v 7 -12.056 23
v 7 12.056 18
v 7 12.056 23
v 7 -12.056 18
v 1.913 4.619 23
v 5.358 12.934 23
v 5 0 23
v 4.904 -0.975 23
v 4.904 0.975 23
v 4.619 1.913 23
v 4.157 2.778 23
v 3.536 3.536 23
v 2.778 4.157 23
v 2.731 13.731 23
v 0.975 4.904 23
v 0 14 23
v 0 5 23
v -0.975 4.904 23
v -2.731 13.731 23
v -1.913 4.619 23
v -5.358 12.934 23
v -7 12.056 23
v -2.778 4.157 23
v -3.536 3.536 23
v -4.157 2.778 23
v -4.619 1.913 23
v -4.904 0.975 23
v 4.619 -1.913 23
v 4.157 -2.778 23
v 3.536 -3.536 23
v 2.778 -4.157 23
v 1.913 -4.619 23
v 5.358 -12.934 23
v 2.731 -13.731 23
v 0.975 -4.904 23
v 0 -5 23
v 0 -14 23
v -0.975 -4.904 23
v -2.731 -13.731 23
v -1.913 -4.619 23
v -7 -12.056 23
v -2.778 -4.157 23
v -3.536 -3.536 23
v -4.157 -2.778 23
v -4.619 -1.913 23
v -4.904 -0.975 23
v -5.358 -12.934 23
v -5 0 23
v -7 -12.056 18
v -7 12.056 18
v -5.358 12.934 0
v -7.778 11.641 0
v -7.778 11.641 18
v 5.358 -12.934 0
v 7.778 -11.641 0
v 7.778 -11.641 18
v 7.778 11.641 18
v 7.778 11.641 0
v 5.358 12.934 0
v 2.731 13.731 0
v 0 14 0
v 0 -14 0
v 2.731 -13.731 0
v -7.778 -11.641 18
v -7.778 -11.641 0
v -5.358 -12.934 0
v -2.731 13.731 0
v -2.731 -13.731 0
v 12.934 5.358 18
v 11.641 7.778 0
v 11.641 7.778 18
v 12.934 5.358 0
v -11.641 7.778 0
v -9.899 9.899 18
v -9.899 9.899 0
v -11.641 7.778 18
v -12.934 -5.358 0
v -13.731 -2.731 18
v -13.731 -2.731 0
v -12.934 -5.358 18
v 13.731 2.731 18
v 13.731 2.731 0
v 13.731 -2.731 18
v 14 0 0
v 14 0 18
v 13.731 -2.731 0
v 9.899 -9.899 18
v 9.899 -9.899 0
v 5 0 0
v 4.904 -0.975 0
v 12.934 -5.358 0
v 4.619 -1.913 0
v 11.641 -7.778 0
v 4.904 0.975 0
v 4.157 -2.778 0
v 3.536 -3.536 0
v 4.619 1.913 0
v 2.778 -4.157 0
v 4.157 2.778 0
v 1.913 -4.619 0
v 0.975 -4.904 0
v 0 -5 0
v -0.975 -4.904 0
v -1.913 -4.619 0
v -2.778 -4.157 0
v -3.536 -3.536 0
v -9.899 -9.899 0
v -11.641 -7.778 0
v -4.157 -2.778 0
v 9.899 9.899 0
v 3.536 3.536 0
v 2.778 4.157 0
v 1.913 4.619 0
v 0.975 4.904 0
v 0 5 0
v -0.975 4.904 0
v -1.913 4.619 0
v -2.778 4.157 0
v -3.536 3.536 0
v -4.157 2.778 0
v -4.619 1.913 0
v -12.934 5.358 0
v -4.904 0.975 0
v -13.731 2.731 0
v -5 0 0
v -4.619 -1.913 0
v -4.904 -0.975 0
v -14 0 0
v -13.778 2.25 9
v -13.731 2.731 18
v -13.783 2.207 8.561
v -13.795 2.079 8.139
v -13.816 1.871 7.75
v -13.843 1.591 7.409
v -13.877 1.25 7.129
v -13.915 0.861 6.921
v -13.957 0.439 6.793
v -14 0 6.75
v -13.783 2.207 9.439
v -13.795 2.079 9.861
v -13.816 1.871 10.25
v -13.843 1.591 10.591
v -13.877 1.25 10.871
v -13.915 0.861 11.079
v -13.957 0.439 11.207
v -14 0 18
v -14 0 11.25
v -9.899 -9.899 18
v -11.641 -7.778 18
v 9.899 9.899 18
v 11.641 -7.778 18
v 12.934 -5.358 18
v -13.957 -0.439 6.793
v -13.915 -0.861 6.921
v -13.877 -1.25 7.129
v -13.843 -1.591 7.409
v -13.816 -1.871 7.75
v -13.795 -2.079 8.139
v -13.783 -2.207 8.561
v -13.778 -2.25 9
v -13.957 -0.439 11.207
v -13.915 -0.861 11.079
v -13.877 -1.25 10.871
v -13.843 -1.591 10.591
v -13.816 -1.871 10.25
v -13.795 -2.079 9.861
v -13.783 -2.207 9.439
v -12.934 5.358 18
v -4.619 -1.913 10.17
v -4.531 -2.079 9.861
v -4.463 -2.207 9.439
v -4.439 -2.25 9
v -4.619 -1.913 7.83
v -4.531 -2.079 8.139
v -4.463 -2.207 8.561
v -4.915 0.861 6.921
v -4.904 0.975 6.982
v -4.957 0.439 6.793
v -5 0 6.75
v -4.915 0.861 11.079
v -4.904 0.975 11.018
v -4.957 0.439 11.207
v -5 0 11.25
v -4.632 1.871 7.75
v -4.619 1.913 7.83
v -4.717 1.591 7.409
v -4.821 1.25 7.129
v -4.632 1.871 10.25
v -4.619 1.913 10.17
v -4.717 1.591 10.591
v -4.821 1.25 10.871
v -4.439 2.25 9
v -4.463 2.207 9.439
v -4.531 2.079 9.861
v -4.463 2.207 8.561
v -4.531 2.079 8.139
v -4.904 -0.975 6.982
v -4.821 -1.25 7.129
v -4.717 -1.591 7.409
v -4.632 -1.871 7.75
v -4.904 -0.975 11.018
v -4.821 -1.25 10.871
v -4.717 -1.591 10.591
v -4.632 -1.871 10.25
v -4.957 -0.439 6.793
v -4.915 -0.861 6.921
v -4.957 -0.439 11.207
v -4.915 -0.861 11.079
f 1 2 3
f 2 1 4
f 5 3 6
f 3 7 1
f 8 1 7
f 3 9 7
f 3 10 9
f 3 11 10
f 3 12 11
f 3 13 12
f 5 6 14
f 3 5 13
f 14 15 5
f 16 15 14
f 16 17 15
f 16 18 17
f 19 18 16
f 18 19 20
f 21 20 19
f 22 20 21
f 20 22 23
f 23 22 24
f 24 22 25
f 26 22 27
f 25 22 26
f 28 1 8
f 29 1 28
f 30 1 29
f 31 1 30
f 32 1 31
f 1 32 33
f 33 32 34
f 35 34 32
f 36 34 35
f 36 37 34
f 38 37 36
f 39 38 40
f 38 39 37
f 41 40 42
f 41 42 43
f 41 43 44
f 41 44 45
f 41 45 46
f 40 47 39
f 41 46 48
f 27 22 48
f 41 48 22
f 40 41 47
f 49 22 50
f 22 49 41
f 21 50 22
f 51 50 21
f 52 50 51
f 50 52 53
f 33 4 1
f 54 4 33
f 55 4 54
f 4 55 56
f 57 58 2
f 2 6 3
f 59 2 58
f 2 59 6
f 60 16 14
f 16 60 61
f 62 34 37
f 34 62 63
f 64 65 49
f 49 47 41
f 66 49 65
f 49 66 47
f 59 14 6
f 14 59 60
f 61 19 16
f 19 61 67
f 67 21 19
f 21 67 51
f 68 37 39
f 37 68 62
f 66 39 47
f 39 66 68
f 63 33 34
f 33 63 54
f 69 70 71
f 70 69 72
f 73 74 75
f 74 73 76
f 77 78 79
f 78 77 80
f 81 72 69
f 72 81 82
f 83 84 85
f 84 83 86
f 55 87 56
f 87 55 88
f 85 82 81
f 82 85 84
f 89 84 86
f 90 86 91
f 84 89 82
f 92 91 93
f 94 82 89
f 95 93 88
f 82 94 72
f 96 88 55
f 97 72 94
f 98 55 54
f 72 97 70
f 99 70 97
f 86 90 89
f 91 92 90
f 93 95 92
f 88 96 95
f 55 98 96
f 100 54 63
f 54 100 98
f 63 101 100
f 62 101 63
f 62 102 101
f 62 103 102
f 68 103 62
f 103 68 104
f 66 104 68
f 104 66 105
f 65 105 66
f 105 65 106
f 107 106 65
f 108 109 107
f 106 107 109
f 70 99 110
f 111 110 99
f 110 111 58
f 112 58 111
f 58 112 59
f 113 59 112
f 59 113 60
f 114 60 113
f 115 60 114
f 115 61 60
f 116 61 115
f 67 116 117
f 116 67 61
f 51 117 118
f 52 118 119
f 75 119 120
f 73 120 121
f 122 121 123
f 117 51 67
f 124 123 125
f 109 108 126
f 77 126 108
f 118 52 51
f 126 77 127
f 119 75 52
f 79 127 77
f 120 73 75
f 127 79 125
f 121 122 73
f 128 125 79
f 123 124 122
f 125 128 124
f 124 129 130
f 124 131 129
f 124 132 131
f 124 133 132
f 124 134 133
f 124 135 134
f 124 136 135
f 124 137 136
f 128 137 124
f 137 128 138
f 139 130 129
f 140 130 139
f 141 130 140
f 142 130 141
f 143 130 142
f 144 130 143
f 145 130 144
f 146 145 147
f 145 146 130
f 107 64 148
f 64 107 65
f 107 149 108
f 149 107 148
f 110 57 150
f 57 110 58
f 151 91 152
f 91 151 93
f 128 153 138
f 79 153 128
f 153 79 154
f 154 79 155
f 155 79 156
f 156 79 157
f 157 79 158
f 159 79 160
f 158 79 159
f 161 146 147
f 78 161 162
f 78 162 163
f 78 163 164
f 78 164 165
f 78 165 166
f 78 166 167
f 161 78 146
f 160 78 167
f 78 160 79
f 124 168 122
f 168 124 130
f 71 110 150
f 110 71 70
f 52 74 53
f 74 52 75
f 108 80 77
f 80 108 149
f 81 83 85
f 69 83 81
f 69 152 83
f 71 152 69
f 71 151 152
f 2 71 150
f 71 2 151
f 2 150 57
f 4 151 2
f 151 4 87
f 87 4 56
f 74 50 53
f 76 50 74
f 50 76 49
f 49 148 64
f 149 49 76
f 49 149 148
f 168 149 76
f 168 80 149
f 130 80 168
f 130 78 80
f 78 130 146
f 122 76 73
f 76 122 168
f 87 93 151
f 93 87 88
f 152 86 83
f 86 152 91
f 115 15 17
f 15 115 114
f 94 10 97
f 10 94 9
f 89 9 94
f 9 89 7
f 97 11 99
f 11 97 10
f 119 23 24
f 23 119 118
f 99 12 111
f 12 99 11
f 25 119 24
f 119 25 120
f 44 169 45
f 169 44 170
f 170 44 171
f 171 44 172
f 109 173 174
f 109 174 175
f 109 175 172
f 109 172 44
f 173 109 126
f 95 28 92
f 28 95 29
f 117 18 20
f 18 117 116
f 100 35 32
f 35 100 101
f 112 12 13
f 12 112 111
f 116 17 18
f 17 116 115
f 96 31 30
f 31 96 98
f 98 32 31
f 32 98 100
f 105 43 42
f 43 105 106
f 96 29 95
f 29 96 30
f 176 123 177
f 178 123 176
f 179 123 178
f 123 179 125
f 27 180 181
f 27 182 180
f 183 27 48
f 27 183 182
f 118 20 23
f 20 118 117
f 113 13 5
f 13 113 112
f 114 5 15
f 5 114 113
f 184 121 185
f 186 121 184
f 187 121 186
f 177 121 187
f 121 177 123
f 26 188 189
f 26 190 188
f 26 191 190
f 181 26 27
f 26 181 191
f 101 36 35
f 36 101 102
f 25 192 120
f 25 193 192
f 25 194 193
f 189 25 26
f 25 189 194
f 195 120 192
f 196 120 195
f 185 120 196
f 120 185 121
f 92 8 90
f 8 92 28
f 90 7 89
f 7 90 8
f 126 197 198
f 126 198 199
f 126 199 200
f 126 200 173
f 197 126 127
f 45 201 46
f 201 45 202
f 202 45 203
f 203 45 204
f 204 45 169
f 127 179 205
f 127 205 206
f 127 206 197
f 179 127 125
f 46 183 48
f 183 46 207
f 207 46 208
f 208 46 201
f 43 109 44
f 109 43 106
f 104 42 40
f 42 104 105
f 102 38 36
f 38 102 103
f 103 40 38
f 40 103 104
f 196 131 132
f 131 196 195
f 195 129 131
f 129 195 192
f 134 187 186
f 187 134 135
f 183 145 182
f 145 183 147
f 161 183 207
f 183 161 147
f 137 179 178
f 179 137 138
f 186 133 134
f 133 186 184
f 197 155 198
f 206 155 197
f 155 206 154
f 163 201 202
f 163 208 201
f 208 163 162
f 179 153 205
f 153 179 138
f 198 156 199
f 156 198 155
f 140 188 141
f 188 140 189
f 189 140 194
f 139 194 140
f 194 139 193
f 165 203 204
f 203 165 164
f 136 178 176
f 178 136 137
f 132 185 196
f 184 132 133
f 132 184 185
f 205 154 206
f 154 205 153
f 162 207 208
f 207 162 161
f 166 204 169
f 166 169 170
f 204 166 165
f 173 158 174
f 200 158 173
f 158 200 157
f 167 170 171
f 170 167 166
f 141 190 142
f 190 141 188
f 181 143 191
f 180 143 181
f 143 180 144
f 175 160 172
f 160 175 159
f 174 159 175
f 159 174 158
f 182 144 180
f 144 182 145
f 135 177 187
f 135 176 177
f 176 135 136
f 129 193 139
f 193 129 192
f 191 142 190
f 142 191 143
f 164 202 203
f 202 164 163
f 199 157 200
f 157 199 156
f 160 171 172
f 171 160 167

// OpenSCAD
$fn = 32;

// ----------------------------------------------------------------------
// Oldham coupling hub: 28 x 23 mm
// ----------------------------------------------------------------------

// --- parameters (mm) ---
hub_d = 28;               // hub diameter
hub_l = 18;               // hub length
bore_d = 10;              // shaft bore
tongue_w = 14;            // drive tongue width
tongue_h = 5;             // drive tongue height
set_d = 4.5;              // set screw tap hole

module hub() {
  cylinder(h = hub_l, d = hub_d);
  /* tongue, clipped to the hub disc and sunk 1 mm into the face */
  intersection() {
    translate([-tongue_w / 2, -hub_d / 2, hub_l - 1])
      cube([tongue_w, hub_d, tongue_h + 1]);
    translate([0, 0, hub_l - 1]) cylinder(h = tongue_h + 1, d = hub_d);
  }
}

difference() {
  hub();
  translate([0, 0, -1]) cylinder(h = hub_l + tongue_h + 2, d = bore_d);
  translate([-hub_d / 2 - 1, 0, hub_l * 0.5])
    rotate([0, 90, 0]) cylinder(h = hub_d / 2 + 2, d = set_d);
}
